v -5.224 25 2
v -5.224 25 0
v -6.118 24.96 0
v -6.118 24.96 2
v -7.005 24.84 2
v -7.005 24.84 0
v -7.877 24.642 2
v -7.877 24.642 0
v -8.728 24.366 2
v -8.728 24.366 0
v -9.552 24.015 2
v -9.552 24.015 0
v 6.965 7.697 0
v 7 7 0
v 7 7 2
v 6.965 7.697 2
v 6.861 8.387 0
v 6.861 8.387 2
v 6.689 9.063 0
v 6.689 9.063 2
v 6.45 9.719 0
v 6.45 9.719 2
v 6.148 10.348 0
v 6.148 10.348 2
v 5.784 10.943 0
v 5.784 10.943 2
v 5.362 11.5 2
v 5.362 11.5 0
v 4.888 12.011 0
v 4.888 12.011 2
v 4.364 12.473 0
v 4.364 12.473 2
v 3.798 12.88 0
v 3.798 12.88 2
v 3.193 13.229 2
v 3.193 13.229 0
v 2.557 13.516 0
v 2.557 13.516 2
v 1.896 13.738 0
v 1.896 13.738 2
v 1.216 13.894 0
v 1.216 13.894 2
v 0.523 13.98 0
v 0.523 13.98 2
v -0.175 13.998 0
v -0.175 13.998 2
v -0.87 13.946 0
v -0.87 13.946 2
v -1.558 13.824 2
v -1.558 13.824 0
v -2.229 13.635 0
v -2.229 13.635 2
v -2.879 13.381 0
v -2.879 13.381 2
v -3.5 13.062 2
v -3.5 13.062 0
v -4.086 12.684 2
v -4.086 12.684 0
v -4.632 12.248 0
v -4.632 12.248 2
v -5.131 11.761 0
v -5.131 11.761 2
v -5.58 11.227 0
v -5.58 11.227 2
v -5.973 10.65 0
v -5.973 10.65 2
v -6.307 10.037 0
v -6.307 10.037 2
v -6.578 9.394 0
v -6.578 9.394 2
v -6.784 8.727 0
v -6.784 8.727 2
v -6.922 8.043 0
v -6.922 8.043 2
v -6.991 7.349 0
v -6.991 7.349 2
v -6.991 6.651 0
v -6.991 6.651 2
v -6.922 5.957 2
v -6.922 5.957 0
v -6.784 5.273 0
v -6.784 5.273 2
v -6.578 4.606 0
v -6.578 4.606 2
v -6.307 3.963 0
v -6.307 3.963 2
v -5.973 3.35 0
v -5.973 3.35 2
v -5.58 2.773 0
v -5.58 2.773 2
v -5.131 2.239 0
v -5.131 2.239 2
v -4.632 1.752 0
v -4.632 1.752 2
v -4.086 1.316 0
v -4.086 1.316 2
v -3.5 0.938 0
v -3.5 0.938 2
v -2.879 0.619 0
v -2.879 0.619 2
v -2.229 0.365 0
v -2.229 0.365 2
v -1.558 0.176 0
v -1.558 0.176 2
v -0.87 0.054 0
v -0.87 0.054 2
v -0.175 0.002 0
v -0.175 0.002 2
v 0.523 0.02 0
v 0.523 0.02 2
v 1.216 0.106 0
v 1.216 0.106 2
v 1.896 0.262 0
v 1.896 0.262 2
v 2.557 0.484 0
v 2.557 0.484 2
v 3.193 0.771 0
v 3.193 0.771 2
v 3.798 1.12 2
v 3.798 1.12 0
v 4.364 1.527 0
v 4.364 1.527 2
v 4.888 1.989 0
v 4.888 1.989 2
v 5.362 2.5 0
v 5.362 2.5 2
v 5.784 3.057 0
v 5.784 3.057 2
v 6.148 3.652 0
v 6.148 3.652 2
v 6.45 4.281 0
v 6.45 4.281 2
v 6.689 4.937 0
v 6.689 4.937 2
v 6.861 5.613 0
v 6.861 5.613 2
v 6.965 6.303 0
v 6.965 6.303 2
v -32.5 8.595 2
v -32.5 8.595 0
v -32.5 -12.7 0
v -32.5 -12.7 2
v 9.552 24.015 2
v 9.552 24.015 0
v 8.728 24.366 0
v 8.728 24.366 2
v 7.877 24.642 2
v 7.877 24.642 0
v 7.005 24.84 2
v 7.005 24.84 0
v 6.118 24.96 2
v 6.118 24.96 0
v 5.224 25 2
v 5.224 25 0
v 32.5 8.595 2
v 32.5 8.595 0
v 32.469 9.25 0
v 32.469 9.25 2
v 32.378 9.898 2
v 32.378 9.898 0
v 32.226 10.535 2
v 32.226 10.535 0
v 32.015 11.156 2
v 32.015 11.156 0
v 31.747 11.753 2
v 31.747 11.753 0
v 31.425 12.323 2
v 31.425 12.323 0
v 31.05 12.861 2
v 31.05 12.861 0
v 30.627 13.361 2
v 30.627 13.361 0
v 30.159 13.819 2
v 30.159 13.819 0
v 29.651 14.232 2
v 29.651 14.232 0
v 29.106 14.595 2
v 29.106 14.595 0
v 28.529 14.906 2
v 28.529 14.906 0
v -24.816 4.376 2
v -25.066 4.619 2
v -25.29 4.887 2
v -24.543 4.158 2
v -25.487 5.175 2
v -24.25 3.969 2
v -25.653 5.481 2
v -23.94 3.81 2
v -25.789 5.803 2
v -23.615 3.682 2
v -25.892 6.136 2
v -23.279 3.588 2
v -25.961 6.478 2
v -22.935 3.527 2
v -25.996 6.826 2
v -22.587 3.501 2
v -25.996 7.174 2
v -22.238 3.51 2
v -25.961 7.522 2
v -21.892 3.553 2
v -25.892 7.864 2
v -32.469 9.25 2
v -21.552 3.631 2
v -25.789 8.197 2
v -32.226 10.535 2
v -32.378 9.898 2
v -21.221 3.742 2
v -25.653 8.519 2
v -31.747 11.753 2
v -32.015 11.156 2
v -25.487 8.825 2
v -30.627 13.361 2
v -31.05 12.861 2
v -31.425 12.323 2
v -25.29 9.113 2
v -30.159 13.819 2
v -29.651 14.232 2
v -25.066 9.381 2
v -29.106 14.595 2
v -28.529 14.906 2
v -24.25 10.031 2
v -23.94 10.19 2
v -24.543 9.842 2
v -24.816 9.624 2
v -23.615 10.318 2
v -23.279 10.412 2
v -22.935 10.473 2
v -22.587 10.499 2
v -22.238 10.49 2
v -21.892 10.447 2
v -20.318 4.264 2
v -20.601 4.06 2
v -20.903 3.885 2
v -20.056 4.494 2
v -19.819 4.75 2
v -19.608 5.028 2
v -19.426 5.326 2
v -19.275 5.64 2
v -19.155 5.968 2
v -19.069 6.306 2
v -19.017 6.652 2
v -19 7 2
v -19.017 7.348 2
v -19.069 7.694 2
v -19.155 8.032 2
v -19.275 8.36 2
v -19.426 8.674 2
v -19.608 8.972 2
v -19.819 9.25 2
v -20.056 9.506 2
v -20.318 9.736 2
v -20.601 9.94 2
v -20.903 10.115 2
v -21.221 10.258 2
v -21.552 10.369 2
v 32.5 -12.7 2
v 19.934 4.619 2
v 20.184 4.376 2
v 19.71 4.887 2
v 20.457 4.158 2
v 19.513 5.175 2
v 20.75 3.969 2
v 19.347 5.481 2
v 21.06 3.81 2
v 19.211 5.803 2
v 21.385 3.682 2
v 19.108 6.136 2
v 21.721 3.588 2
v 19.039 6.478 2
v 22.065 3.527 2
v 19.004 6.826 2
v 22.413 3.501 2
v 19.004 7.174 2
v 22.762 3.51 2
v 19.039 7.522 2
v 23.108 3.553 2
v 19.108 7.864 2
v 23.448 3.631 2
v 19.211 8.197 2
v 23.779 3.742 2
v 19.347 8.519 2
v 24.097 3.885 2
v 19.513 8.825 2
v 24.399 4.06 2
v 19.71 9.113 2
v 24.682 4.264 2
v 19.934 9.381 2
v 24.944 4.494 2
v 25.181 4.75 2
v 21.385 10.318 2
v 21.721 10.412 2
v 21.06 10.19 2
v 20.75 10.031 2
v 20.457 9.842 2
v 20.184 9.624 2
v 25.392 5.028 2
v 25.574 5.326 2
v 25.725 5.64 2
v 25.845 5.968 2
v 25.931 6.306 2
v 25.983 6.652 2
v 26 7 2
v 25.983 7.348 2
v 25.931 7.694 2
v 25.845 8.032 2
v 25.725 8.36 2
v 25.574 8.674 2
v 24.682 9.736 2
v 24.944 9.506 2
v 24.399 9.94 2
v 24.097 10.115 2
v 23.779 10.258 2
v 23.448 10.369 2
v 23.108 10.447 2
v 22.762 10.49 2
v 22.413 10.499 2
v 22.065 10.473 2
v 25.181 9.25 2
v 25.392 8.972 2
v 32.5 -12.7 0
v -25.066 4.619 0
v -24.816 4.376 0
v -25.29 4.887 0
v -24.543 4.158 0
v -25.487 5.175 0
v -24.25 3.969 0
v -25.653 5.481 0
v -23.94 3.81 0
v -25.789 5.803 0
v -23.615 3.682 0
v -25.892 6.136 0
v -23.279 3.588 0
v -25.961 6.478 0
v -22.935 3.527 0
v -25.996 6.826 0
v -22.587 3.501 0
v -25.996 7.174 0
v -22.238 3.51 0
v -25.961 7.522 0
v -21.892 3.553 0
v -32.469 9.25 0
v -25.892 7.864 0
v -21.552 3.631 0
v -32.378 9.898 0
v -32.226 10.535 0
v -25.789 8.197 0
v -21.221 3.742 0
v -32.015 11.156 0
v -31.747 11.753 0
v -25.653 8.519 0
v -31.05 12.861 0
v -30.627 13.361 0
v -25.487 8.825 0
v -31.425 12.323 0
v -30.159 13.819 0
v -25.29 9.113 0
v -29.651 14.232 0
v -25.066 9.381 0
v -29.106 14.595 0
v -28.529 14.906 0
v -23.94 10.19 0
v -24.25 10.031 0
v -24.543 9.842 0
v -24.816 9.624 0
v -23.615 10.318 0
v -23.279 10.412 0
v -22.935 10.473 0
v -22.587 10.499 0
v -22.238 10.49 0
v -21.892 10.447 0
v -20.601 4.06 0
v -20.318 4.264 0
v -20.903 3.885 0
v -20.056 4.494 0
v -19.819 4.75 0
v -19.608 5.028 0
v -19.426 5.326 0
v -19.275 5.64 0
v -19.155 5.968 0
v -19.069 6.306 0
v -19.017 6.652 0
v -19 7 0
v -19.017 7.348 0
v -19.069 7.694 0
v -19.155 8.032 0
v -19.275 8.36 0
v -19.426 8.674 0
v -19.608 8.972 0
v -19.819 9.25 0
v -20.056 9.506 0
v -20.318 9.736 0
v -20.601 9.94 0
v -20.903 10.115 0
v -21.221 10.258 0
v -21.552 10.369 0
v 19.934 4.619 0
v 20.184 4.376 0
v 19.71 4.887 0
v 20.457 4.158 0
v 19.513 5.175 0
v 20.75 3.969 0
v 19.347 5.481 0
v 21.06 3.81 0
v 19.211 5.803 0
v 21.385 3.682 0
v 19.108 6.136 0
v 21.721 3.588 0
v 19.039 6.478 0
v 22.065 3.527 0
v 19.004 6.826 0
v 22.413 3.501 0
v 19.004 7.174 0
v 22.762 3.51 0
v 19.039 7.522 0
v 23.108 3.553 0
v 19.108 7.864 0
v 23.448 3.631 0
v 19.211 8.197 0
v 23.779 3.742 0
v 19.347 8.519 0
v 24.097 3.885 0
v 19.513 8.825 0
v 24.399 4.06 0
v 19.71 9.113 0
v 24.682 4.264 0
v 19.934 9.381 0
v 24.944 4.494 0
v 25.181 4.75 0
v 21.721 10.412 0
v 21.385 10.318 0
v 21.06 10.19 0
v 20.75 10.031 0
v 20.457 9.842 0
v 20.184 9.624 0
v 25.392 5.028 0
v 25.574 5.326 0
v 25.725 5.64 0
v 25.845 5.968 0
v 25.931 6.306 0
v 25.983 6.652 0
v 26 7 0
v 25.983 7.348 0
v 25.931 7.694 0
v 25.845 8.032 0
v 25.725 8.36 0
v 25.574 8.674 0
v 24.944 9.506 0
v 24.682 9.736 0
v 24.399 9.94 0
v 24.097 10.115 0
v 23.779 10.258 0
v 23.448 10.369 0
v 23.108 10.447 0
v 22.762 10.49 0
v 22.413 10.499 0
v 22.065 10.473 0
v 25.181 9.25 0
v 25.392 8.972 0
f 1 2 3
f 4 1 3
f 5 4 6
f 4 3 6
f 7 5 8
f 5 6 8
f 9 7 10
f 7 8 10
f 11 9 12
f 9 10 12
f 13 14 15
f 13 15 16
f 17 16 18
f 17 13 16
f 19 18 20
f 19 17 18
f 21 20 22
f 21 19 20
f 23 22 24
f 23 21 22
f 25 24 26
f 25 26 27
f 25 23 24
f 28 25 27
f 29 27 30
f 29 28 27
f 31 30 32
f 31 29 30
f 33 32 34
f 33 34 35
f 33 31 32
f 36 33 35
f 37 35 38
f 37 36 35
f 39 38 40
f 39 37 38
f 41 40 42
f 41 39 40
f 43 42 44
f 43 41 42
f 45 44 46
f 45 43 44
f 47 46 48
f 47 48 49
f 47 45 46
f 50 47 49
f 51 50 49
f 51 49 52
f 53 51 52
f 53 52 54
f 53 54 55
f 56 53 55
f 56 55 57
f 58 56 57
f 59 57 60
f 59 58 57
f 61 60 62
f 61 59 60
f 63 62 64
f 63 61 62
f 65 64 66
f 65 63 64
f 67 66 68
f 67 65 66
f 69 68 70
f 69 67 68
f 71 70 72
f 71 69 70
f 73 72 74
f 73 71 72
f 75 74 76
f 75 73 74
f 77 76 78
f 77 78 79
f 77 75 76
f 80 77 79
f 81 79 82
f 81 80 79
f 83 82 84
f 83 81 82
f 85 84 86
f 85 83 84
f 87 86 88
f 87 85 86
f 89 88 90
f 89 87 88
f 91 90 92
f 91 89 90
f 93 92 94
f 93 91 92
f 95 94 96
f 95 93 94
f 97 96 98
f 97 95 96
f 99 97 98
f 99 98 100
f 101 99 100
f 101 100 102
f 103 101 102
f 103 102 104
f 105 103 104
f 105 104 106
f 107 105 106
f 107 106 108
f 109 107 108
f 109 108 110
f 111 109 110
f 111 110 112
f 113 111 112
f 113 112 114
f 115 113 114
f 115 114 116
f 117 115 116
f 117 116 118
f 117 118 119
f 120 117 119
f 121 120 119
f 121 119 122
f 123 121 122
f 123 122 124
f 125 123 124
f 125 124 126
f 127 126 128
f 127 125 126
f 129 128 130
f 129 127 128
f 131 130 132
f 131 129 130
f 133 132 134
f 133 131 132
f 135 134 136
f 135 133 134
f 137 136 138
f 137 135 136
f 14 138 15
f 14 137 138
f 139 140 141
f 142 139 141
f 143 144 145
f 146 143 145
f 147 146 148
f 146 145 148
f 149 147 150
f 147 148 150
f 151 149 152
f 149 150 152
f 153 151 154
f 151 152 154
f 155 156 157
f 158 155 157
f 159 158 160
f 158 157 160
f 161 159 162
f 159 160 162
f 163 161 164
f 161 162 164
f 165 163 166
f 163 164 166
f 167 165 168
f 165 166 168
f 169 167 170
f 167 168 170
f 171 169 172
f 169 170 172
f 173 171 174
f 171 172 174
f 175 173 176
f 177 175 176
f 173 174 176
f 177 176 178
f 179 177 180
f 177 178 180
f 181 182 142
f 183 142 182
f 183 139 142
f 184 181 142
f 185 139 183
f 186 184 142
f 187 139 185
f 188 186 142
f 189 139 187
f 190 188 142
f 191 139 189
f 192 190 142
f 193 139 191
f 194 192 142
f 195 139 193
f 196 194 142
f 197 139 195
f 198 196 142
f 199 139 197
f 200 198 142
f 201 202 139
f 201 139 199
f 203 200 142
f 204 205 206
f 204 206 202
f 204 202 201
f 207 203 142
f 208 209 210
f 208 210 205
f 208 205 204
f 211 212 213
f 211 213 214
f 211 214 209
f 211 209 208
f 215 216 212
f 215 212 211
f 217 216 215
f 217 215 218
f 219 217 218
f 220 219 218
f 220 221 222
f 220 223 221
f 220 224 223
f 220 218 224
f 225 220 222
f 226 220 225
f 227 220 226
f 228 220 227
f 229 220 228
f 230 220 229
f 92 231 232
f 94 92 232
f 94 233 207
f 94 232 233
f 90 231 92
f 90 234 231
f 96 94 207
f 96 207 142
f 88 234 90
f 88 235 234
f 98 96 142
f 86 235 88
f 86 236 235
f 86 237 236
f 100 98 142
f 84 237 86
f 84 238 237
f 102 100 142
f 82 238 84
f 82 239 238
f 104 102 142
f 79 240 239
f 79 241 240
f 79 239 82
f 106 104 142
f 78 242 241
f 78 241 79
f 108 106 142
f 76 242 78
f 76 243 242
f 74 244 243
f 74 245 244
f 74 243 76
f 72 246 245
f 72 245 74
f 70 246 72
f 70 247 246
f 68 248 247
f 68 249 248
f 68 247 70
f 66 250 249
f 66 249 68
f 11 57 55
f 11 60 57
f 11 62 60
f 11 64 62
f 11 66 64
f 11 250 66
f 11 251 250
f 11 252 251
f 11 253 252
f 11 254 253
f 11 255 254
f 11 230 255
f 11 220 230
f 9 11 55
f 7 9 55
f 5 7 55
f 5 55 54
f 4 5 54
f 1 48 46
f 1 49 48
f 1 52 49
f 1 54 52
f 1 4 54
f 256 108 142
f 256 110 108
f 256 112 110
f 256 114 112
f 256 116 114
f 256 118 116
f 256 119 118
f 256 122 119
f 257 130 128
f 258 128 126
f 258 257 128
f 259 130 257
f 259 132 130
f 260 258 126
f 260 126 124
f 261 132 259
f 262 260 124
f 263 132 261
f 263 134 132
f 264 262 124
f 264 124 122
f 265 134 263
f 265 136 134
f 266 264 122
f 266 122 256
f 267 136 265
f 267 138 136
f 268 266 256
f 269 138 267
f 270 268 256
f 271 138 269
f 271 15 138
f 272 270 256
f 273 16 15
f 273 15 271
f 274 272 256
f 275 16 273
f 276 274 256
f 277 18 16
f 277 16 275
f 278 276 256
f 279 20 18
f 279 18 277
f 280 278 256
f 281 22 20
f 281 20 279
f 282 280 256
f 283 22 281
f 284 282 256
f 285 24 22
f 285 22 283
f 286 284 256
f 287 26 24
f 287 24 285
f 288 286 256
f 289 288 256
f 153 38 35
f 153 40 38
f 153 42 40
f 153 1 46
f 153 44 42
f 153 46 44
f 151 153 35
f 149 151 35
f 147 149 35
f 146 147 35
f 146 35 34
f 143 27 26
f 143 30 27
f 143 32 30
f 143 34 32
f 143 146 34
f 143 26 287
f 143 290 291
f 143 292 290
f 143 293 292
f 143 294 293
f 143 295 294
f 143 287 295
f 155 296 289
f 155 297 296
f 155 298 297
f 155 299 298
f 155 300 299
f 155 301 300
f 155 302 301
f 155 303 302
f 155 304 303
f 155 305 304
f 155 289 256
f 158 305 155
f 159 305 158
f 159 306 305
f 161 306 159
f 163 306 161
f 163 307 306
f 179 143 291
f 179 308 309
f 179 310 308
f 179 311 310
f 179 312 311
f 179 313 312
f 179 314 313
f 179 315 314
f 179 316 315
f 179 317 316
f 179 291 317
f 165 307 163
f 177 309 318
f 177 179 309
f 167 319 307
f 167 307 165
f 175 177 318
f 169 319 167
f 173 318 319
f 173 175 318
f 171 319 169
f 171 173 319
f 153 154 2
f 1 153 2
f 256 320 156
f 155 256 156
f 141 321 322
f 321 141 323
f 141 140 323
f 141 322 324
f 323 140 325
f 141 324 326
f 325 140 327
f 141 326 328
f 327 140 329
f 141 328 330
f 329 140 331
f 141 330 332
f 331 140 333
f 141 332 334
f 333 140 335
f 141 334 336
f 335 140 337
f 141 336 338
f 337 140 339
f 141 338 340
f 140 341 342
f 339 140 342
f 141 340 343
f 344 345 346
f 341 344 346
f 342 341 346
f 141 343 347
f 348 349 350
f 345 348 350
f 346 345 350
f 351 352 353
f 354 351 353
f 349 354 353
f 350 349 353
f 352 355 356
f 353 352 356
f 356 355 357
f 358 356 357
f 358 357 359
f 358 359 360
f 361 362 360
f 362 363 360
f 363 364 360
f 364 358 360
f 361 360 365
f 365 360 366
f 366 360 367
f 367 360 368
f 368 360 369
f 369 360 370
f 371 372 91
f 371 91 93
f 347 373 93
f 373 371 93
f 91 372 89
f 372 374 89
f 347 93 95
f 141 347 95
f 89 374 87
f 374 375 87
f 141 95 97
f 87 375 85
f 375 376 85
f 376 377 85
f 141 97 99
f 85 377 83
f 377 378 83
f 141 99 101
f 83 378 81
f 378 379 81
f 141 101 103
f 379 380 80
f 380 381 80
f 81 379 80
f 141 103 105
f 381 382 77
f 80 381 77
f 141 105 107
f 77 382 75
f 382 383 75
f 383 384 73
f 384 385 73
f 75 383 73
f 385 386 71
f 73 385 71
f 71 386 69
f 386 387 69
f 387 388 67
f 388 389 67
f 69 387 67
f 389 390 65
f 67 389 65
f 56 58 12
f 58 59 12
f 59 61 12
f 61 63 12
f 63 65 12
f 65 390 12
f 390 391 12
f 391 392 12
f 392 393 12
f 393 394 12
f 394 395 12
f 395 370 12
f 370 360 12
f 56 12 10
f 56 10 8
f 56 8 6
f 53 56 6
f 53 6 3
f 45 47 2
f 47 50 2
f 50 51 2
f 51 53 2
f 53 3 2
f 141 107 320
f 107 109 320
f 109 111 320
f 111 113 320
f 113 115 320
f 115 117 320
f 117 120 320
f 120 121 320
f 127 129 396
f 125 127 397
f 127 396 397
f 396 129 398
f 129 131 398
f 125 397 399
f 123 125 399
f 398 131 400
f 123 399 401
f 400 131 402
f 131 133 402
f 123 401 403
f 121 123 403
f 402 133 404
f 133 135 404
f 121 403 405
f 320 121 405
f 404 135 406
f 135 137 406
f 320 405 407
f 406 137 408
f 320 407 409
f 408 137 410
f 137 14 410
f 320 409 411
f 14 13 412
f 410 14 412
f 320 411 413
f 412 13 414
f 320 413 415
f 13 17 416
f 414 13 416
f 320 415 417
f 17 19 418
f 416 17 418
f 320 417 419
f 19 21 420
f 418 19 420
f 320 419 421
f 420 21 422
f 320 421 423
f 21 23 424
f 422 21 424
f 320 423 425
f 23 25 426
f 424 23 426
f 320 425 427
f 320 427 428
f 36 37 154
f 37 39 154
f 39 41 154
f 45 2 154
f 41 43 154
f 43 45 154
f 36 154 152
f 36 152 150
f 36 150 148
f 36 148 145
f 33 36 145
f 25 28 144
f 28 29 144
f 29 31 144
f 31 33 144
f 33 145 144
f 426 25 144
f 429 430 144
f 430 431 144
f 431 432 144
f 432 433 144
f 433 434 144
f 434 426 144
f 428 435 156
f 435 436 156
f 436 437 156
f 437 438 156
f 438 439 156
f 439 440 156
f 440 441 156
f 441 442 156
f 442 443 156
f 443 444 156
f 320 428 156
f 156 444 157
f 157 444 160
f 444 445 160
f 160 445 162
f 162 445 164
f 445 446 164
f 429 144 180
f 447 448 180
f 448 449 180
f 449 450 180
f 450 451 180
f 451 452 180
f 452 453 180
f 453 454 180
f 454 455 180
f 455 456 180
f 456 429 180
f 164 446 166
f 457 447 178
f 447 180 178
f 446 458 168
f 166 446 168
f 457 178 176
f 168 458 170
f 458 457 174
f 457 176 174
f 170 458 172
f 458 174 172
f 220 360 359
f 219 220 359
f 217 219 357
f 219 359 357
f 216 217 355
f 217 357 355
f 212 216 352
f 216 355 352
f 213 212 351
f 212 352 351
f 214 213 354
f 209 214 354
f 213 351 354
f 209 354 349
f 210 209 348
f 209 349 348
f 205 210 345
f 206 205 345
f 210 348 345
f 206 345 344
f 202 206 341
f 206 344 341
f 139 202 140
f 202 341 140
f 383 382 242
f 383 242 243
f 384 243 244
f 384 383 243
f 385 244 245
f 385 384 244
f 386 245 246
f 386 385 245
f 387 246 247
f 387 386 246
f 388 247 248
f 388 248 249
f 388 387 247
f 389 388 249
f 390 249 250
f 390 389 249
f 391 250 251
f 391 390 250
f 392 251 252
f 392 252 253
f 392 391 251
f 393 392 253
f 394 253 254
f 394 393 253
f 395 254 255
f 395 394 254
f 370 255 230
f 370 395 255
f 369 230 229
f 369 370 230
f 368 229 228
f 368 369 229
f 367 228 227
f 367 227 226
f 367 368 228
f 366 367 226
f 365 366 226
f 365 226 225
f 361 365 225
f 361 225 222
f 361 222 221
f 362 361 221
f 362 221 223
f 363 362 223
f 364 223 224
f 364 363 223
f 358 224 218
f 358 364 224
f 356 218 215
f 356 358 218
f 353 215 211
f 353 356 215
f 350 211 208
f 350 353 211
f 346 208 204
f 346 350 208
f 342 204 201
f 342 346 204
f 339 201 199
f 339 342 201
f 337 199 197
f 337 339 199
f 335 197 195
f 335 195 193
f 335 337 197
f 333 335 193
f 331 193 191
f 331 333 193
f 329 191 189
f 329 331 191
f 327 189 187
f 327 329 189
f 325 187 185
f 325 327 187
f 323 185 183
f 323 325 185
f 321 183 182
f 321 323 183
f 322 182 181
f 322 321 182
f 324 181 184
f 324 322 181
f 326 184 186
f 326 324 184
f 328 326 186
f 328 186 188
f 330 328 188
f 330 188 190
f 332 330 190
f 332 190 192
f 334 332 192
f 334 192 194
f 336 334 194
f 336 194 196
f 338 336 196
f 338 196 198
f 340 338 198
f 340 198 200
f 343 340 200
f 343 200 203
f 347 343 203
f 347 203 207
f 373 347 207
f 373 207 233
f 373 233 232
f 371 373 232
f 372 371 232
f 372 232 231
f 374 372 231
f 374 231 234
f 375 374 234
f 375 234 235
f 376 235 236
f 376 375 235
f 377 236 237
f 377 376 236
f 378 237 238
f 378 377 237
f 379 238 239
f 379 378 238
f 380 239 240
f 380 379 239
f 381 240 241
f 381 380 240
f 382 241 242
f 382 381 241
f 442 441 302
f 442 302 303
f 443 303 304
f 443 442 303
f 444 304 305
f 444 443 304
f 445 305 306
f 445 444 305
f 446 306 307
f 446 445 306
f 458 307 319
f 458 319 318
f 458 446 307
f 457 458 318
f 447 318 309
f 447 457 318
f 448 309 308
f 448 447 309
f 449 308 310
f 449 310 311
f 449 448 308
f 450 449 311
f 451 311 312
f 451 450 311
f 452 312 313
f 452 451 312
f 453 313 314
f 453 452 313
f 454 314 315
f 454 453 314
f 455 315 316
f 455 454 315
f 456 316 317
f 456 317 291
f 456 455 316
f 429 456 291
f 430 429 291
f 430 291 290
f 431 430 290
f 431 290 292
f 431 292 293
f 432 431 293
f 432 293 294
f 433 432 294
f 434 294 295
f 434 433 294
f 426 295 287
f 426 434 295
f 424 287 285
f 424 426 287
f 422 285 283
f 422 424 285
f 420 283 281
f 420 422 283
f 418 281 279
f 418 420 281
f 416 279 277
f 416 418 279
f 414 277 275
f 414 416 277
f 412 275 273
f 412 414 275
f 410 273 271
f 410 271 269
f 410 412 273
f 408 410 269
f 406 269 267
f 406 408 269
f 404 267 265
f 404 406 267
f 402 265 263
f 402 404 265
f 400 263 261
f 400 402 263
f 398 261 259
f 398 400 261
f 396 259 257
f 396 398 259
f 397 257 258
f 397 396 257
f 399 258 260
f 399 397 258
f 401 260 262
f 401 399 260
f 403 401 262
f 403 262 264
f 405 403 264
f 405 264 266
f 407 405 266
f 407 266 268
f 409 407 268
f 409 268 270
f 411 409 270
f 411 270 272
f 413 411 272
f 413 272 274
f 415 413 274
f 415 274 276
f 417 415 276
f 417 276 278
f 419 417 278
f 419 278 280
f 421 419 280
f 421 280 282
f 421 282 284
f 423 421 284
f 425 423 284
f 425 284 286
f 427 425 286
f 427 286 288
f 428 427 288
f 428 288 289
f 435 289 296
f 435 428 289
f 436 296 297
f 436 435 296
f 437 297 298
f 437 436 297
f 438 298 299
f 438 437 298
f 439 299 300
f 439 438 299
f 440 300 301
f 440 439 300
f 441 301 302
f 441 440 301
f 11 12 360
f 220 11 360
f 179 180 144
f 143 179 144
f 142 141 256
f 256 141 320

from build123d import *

# Parameters (mm, degrees)
SKETCH1_R           = 7
SKETCH1_R_2         = 3.5
BOSS_EXTRUDE1_DEPTH = 2


with BuildPart() as part:
    # Sketch1 → Boss-Extrude1 (new body)
    with BuildSketch(Plane.XY):
        with BuildLine():
            Line((-32.5, -12.7), (32.5, -12.7))
            Line((32.5, -12.7), (32.5, 8.595362211))
            ThreePointArc((32.5, 8.595362211), (31.424686587, 12.323376272), (28.529117473, 14.906023613))
            Line((28.529117473, 14.906023613), (9.551602969, 24.015230575))
            ThreePointArc((9.551602969, 24.015230575), (7.443266635, 24.750700122), (5.224292294, 25))
            Line((5.224292294, 25), (-5.224292294, 25))
            ThreePointArc((-5.224292294, 25), (-7.443266635, 24.750700122), (-9.551602969, 24.015230575))
            Line((-9.551602969, 24.015230575), (-28.529117473, 14.906023613))
            ThreePointArc((-28.529117473, 14.906023613), (-31.424686587, 12.323376272), (-32.5, 8.595362211))
            Line((-32.5, 8.595362211), (-32.5, -12.7))
        make_face()
        with Locations((0, 7)):
            Circle(SKETCH1_R, mode=Mode.SUBTRACT)
        with Locations((-22.5, 7)):
            Circle(SKETCH1_R_2, mode=Mode.SUBTRACT)
        with Locations((22.5, 7)):
            Circle(SKETCH1_R_2, mode=Mode.SUBTRACT)
    extrude(amount=BOSS_EXTRUDE1_DEPTH)


solid = part.part
